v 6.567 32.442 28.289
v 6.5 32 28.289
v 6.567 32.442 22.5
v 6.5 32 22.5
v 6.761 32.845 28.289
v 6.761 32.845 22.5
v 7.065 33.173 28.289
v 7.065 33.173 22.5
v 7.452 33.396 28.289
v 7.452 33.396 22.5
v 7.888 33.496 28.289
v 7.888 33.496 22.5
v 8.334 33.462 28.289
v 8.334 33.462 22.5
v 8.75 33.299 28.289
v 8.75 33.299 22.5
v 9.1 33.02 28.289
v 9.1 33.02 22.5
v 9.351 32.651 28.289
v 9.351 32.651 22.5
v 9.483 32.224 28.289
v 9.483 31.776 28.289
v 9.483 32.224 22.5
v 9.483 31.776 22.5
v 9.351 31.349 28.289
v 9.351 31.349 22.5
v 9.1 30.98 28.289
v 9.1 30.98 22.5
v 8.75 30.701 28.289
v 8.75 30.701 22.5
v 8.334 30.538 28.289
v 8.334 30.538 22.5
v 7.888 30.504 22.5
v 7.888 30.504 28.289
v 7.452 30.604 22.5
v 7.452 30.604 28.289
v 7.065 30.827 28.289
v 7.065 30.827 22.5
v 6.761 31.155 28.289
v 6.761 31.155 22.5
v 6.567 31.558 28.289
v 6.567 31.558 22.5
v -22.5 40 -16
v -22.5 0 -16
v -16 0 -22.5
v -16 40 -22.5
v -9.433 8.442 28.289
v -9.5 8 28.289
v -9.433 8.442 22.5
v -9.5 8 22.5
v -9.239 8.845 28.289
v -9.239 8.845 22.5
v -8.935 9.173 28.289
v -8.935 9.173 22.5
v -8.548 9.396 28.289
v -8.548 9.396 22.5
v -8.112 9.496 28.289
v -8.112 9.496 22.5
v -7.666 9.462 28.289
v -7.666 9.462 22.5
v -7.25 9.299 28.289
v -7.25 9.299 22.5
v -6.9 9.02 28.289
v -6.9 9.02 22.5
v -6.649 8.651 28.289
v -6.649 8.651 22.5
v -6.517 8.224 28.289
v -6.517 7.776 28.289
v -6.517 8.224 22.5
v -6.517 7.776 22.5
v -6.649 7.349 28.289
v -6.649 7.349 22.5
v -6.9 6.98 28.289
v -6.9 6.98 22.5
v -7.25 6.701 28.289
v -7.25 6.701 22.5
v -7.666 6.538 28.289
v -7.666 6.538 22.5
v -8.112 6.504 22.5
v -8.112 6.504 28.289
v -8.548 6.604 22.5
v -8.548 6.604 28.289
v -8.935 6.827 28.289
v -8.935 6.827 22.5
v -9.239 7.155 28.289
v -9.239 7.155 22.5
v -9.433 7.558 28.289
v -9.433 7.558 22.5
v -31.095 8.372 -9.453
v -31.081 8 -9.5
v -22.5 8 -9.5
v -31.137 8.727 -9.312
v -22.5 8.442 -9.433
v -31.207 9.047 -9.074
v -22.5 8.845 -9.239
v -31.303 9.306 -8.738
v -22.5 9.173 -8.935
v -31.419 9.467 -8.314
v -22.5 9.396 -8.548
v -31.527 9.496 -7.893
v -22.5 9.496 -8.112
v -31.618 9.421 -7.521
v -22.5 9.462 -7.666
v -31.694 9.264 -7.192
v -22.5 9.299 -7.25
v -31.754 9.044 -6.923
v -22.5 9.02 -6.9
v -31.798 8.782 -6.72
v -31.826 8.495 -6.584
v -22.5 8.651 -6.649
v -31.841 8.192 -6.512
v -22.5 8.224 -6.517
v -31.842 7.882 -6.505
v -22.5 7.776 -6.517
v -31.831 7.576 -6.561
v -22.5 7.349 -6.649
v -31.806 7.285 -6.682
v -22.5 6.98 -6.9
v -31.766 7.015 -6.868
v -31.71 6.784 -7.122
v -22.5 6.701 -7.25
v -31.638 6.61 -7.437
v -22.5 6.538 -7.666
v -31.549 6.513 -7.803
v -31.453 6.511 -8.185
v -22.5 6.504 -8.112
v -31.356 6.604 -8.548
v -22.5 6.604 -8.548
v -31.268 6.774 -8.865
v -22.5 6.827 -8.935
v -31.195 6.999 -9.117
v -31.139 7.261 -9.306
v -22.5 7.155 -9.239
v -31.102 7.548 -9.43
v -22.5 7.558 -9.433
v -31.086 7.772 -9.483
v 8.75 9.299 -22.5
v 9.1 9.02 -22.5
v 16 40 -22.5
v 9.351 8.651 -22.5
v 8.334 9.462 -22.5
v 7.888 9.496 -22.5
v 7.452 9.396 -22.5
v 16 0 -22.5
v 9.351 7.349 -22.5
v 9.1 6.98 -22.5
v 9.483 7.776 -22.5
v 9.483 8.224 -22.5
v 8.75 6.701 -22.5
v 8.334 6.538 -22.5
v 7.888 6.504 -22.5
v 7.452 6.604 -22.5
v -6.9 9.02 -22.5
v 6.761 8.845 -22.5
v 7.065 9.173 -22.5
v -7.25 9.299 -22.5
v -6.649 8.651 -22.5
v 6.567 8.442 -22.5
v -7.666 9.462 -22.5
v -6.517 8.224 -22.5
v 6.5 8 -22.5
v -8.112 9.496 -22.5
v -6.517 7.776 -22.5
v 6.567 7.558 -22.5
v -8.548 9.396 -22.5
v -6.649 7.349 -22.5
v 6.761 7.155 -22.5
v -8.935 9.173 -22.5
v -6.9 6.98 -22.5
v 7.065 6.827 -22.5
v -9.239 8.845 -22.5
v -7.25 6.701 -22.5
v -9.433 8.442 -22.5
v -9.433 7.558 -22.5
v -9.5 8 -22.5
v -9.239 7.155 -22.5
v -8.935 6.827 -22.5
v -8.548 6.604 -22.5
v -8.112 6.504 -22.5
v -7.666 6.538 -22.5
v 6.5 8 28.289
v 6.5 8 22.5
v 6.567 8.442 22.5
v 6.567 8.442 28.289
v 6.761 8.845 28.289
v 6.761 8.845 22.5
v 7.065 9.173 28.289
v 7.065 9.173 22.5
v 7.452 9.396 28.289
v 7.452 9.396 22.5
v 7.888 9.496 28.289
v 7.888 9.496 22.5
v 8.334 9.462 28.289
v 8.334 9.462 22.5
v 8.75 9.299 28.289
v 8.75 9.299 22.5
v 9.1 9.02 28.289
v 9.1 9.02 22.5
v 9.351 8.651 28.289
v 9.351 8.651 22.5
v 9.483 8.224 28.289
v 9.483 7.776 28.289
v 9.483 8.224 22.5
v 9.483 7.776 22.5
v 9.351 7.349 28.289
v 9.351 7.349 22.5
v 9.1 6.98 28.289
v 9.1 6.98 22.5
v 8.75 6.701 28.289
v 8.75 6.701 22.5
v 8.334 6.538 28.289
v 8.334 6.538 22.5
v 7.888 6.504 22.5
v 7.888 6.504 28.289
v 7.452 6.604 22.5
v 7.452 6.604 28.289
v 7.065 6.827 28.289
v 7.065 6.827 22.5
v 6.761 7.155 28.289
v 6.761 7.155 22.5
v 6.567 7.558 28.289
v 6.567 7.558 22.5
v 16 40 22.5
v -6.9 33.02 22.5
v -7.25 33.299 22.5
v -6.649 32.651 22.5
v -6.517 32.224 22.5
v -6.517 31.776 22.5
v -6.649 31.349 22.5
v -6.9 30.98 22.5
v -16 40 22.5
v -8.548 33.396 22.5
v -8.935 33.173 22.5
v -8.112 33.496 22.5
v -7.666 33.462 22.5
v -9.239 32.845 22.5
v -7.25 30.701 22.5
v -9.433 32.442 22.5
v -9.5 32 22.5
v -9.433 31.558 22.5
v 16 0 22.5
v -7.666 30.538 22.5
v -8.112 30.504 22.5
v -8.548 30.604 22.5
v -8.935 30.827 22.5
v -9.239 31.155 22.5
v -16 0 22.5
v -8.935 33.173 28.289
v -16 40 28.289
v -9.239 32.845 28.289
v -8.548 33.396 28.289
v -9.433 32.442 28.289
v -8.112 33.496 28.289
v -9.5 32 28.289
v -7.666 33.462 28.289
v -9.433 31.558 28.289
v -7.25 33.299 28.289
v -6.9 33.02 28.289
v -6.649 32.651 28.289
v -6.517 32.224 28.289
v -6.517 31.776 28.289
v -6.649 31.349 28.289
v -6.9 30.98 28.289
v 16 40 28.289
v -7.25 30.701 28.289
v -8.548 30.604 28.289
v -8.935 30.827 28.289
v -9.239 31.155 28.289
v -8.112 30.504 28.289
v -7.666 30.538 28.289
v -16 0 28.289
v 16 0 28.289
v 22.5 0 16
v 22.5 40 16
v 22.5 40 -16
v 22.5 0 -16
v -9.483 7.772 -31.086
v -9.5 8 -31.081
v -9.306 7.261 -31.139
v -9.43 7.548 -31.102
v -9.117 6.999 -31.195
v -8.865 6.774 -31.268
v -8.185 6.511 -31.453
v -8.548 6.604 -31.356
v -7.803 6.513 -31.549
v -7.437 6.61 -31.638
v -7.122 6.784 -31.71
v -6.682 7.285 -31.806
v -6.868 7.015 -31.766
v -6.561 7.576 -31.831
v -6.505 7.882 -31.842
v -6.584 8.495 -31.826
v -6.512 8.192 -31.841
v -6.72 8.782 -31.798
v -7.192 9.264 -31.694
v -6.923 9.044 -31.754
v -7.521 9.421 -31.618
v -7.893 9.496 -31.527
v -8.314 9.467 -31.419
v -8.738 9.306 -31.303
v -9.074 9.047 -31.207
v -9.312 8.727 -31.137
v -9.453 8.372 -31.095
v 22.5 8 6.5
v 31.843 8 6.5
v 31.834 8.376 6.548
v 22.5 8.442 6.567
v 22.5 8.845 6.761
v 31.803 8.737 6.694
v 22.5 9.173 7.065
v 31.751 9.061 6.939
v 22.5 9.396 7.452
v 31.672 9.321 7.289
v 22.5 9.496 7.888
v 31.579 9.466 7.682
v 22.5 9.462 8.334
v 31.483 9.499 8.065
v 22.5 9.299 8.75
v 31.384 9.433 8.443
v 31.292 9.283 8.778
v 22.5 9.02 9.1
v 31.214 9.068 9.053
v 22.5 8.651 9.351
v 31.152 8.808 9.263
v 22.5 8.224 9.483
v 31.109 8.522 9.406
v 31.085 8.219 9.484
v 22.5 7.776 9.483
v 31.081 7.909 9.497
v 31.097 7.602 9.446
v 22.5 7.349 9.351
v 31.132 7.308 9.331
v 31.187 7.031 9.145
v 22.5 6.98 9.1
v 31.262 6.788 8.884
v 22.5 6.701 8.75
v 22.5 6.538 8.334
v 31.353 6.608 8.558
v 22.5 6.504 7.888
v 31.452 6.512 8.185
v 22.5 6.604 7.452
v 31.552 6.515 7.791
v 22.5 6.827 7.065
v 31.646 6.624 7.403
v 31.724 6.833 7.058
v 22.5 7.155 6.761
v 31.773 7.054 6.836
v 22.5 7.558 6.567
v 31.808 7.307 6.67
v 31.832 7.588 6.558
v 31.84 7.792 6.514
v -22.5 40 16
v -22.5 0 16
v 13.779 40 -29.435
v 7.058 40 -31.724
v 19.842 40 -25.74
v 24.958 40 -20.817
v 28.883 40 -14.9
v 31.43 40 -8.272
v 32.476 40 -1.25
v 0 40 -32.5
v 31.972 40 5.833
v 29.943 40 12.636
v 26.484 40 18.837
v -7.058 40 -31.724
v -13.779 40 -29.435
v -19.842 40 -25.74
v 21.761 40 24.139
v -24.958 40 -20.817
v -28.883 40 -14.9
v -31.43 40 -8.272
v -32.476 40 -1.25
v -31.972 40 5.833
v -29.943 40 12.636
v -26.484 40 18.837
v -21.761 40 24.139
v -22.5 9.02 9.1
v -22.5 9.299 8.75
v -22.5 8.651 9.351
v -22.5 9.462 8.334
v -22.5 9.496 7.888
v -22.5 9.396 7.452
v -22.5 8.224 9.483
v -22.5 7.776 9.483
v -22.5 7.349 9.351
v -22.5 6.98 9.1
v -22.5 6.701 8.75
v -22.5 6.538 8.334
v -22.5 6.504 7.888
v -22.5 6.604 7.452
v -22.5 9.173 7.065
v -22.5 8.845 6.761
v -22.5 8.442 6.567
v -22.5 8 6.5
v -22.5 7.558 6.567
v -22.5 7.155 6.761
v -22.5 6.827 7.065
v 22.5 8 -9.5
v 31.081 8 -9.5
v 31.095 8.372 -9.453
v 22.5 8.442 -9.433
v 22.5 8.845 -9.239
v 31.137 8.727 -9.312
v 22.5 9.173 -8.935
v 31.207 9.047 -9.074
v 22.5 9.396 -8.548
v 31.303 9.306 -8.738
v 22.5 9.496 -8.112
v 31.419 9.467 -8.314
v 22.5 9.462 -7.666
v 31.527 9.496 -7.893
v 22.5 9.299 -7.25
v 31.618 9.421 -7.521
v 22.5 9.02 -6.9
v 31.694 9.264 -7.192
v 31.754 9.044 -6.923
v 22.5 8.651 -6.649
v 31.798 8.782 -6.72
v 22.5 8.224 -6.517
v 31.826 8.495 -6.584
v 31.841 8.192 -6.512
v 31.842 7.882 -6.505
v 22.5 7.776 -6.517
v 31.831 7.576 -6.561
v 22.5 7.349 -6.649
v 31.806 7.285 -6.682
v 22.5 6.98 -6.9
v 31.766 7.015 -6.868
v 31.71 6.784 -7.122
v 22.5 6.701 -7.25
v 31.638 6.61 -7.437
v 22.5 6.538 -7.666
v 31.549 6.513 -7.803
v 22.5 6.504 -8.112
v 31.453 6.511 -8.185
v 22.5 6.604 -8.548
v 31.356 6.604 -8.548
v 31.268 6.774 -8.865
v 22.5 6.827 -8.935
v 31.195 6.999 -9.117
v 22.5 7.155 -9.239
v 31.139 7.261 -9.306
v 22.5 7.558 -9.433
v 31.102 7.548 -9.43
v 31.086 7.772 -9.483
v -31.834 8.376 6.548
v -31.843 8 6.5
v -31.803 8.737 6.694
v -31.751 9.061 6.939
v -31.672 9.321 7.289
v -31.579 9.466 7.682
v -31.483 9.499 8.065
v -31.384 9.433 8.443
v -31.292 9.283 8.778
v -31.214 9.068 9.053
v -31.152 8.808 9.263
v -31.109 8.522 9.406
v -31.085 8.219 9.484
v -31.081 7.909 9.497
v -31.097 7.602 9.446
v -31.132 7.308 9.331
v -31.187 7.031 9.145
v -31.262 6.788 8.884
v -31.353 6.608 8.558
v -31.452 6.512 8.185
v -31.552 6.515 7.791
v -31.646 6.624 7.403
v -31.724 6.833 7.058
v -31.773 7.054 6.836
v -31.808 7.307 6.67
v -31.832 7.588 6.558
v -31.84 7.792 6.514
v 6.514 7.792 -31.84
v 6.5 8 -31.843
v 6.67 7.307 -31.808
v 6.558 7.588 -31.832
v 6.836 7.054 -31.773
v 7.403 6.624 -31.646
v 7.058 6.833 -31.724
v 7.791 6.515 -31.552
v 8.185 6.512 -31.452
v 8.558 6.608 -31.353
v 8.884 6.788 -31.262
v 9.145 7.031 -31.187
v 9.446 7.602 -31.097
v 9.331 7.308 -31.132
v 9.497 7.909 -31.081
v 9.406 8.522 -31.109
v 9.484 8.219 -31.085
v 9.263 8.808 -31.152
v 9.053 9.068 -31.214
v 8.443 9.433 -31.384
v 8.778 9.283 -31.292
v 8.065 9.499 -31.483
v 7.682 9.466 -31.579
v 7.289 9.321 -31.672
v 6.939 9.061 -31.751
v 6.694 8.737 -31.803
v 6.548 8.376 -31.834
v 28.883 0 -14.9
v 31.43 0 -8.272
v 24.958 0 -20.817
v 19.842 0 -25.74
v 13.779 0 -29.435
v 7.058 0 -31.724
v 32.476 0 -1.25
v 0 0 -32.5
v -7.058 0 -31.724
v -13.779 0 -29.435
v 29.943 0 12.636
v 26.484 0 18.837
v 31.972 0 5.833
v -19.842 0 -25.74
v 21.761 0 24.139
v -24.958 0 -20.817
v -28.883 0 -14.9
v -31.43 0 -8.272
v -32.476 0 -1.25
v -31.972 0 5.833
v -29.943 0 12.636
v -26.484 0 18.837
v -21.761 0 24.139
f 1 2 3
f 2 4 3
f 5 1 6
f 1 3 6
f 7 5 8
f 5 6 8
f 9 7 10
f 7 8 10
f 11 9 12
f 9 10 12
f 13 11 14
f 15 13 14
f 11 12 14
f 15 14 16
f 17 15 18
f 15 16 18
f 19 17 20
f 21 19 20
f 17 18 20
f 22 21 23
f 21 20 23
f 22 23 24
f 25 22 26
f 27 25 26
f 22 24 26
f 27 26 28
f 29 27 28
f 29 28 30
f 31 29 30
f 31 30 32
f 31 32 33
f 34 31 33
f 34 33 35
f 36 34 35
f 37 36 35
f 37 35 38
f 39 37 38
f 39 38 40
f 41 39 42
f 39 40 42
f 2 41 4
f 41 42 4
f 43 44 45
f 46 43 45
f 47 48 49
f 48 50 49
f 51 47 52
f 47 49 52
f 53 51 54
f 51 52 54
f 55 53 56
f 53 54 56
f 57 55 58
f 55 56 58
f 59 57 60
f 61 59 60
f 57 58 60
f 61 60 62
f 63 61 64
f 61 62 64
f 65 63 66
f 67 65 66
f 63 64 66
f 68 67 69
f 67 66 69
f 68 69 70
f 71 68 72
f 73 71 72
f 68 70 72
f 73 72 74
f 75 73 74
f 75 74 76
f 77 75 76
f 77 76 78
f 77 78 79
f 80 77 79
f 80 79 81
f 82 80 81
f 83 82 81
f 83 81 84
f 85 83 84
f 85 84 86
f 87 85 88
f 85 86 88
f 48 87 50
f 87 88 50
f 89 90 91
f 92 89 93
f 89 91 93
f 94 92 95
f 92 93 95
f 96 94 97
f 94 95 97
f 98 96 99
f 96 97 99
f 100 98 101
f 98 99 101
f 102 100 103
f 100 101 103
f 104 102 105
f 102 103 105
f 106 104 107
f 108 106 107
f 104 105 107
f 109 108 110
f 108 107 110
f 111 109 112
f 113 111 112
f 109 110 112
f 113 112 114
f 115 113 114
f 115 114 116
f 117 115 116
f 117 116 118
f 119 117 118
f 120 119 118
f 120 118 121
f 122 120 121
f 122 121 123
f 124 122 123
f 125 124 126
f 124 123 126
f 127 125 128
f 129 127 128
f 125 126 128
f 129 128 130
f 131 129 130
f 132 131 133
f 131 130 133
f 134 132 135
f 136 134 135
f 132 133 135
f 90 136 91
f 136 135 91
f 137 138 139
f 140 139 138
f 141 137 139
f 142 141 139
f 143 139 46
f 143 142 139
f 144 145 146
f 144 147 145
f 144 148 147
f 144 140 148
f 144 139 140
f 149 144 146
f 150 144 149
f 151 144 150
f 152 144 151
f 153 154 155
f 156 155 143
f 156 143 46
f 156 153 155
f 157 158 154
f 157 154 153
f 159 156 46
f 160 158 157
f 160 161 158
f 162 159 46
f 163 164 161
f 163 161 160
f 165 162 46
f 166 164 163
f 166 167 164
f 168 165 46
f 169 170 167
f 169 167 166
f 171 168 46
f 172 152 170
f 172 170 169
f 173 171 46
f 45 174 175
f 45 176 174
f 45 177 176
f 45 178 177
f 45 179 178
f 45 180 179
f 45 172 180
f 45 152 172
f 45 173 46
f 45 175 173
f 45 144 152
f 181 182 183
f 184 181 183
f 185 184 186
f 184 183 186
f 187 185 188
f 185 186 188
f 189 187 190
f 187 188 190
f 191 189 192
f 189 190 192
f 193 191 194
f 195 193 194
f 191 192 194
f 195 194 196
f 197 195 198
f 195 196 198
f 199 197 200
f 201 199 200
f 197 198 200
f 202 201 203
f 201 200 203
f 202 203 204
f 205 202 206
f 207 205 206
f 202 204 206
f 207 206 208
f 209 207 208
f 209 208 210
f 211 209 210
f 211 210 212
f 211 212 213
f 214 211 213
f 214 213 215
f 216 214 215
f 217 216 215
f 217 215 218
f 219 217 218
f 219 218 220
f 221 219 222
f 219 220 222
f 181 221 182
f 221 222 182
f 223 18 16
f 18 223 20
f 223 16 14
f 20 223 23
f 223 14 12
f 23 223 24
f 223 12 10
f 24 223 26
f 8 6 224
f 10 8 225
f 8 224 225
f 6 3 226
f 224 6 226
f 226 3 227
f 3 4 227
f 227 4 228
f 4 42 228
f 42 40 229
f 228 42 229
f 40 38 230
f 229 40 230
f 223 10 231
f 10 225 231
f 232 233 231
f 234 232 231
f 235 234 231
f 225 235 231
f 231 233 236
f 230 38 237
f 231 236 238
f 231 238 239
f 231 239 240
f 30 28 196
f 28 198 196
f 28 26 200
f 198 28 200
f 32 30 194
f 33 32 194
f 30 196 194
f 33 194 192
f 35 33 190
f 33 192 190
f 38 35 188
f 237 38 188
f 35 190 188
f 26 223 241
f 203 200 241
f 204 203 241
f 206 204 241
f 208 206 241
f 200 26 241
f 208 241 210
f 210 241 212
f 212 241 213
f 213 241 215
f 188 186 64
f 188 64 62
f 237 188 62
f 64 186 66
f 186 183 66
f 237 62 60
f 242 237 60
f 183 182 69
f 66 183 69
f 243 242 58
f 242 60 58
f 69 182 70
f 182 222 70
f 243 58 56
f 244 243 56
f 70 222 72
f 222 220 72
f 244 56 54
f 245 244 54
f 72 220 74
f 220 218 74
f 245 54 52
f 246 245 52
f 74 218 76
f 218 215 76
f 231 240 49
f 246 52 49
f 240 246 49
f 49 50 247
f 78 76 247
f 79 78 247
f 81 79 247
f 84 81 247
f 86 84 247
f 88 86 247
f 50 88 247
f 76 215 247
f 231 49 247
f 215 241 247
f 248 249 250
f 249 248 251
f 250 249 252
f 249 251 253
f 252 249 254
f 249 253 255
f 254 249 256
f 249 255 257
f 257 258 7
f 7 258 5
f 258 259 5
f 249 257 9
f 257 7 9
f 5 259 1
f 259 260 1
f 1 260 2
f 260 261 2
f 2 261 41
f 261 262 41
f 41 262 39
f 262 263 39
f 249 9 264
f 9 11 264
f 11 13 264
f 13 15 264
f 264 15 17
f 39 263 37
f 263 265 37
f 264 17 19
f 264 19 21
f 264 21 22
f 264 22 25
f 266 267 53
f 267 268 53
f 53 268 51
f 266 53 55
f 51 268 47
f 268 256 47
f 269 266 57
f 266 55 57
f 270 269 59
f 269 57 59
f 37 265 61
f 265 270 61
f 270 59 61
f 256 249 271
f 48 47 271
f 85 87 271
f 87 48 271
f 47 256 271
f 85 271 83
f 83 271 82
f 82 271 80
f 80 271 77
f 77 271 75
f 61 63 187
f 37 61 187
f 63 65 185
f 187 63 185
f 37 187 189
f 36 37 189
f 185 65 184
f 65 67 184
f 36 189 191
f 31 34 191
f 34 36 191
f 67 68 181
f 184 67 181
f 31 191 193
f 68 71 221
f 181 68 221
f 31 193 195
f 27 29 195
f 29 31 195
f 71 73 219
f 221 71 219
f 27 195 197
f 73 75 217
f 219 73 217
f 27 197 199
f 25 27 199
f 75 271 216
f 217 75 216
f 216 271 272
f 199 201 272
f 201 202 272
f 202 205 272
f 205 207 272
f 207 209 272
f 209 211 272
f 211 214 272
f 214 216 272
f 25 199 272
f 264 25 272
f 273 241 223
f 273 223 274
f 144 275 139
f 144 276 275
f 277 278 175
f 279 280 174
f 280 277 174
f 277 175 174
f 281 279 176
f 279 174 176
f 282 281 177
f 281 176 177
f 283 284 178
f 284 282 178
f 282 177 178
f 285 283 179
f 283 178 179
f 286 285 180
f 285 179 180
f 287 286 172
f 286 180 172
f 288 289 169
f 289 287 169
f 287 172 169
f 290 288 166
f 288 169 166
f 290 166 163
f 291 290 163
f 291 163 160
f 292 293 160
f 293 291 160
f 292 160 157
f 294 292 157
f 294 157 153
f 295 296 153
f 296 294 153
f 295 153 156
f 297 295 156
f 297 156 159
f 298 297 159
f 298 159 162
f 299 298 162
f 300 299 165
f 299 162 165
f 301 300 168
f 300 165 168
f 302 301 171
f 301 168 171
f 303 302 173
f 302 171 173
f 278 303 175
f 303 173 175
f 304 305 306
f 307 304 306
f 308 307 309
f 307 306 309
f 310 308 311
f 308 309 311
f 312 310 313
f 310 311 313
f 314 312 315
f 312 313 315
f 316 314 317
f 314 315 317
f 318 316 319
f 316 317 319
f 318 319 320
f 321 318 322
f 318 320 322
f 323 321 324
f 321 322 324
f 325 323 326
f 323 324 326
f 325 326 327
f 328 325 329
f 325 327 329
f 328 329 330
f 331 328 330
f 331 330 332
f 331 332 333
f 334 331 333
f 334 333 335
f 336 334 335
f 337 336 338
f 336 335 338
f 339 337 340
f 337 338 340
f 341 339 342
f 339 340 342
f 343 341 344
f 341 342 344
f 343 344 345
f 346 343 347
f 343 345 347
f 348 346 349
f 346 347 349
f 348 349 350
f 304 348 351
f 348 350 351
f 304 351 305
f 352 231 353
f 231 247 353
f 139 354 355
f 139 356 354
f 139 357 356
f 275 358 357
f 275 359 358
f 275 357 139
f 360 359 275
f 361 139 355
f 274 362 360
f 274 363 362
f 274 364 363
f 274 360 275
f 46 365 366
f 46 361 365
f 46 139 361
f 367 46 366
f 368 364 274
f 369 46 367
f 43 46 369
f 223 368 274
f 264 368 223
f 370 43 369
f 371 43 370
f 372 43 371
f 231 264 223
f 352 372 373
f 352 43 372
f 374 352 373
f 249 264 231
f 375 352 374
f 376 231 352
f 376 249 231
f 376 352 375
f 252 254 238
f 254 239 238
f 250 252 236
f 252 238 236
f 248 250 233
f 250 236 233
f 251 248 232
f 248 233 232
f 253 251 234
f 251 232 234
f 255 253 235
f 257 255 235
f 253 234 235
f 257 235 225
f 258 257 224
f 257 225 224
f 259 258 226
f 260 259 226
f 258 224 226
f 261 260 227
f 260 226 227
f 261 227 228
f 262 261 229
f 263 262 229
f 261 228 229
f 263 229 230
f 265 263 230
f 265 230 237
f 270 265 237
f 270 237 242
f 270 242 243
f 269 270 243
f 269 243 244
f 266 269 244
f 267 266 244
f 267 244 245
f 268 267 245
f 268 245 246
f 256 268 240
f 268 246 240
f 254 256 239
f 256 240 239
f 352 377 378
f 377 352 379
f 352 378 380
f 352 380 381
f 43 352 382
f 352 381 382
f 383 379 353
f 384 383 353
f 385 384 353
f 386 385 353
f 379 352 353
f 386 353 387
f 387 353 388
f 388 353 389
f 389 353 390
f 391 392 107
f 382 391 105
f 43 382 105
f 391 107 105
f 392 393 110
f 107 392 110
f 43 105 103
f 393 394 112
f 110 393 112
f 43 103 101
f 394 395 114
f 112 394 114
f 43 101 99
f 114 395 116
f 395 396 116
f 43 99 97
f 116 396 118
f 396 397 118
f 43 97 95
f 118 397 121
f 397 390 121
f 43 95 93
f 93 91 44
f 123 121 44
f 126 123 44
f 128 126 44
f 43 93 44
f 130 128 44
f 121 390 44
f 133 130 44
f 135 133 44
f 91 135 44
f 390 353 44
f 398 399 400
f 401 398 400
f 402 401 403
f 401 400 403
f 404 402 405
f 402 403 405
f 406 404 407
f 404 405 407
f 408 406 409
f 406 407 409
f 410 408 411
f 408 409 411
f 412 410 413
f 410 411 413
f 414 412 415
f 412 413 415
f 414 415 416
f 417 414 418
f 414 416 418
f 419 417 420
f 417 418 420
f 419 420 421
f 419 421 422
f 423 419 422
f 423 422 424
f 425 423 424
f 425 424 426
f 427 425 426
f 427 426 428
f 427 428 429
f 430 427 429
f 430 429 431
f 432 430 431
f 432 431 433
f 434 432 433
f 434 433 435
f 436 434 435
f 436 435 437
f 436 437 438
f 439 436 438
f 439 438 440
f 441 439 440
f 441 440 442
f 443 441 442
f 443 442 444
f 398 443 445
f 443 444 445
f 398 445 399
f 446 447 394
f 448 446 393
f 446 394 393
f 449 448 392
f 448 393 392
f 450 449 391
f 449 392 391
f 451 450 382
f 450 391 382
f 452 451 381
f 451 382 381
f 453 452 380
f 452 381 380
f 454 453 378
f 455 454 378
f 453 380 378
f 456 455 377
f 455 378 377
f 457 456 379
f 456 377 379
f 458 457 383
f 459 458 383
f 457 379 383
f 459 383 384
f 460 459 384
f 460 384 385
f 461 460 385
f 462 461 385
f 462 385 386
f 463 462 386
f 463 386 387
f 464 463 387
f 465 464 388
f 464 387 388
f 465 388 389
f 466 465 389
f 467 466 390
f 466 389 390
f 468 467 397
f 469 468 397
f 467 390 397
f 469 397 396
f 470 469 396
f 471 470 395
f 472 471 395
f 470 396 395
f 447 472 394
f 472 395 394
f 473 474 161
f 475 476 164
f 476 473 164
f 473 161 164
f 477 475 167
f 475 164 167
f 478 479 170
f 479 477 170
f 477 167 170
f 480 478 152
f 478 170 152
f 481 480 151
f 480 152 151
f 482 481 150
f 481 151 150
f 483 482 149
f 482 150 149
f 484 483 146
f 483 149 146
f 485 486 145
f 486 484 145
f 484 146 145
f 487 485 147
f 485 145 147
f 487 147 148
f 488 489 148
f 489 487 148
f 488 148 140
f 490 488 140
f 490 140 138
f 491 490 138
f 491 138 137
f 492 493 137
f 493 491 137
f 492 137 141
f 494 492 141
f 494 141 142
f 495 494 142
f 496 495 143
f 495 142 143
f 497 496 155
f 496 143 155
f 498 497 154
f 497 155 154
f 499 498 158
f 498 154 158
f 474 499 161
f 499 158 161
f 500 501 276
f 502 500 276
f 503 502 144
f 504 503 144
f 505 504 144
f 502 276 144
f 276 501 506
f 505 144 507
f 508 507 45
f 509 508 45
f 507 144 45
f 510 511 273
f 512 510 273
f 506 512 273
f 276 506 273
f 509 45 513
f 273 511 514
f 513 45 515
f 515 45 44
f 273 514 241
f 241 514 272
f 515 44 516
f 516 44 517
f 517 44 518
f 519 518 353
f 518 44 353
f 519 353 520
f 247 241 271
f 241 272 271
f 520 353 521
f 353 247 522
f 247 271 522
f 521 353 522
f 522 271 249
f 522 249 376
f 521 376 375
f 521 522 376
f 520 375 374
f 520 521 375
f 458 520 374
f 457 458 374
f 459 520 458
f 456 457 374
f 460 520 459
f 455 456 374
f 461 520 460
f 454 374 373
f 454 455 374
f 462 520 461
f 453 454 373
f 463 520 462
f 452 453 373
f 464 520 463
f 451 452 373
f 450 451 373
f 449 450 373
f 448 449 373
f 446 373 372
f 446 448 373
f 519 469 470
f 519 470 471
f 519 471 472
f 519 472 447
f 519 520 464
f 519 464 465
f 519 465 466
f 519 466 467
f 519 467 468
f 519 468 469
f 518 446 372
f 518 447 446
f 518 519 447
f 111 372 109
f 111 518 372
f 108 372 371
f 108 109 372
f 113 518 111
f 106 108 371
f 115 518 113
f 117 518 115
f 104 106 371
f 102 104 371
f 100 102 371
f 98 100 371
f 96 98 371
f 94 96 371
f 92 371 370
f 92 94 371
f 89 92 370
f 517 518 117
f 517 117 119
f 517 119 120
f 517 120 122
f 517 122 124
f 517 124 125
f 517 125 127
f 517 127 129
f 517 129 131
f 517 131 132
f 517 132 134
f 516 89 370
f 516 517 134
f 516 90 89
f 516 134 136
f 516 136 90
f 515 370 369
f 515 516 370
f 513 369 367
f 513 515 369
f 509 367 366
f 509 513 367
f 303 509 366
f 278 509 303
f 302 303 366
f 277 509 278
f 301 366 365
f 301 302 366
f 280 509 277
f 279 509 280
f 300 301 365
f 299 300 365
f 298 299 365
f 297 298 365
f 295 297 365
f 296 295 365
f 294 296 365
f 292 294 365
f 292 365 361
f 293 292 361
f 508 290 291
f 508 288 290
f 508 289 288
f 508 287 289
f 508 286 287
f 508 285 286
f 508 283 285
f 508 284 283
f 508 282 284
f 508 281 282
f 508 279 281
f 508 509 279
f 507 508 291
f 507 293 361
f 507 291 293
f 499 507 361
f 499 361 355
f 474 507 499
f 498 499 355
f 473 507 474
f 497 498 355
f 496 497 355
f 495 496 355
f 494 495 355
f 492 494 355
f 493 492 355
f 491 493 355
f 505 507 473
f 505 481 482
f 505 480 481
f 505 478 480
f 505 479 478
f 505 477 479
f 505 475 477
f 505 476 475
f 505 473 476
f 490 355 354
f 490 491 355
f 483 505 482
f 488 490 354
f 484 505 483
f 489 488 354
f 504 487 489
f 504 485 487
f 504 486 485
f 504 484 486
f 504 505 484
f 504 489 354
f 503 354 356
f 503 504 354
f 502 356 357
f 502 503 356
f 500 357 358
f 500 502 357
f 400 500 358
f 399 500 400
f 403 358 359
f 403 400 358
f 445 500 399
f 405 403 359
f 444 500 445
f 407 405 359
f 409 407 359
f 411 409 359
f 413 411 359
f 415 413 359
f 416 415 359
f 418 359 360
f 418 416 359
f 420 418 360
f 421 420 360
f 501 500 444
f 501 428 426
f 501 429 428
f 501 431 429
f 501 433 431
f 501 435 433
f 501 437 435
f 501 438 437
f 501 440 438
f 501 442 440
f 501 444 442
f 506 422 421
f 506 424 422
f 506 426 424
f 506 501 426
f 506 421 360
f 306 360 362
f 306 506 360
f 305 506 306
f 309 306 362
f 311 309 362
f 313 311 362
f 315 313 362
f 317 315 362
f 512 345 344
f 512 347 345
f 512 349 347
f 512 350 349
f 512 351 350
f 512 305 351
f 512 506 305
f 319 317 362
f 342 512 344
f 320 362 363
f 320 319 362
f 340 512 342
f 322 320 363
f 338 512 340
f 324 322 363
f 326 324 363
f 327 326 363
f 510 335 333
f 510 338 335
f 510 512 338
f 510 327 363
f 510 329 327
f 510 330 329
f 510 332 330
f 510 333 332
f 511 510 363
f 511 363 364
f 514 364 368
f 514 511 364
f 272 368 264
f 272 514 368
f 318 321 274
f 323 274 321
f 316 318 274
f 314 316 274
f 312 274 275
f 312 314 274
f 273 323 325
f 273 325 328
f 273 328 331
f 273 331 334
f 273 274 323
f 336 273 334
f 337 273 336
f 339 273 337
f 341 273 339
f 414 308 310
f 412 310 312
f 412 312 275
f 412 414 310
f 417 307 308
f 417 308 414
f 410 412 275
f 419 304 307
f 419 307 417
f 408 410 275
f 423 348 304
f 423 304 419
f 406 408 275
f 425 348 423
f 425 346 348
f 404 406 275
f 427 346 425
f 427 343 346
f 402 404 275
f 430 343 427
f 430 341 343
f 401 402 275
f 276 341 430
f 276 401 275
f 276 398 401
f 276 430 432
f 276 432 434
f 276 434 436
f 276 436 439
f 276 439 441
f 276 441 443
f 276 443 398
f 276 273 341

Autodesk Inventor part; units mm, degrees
ref_plane "YZ Plane" through (0, 0, 0) normal (1, 0, 0) x (0, 1, 0)
ref_plane "XZ Plane" through (0, 0, 0) normal (0, 1, 0) x (-1, 0, 0)
ref_plane "XY Plane" through (0, 0, 0) normal (0, 0, 1) x (1, 0, 0)
sketch "Boceto1" plane through (0, 0, 0) normal (0, 1, 0) x (-1, 0, 0)
  circle A0 centre (0, 0) radius 32.5
  line L0 (0, -22.5) -> (16, -22.5)
  line L1 (0, -22.5) -> (-16, -22.5)
  line L2 (-22.5, 0) -> (-22.5, -16)
  line L3 (-22.5, 0) -> (-22.5, 16)
  line L4 (0, 22.5) -> (16, 22.5)
  line L5 (0, 22.5) -> (-16, 22.5)
  line L6 (-16, 22.5) -> (-22.5, 16)
  line L7 (-22.5, -16) -> (-16, -22.5)
  line L8 (22.5, 0) -> (22.5, 16)
  line L9 (22.5, 0) -> (22.5, -16)
  line L10 (22.5, -16) -> (16, -22.5)
  line L11 (16, 22.5) -> (22.5, 16)
extrude "Extrusión1" add sketch "Boceto1" along normal blind 40
sketch "Boceto14" plane through (0, 0, 0) normal (0, -1, 0) x (1, 0, 0)
  line L0 (-16, 28.2887) -> (16, 28.2887)
  arc A0 (16, 28.2887) -> (-16, 28.2887) centre (0, 0) ccw
  point P0 (16, 22.5)
  point P1 (-16, 22.5)
extrude "Extrusión10" cut sketch "Boceto14" against normal blind 40
sketch "Boceto15" plane through (-22.5, 0, 16) normal (1, 0, 0) x (0, 0, -1)
  circle A0 centre (8, 8) radius 1.5
  circle A1 centre (24, 8) radius 1.5
  point P0 (16, 0)
  point P1 (0, 0)
  dimension "d80" = 3
  dimension "d81" = 3
extrude "Extrusión11" cut sketch "Boceto15" against normal mid plane 200
sketch "Boceto16" plane through (16, 0, 22.5) normal (0, 0, -1) x (-1, 0, 0)
  line L0 (-6.5, 0) -> (0, 0) projected
  circle A0 centre (8, 8) radius 1.5
  circle A1 centre (24, 8) radius 1.5
  point P0 (16, 0)
  dimension "d88" = 3
  dimension "d89" = 3
extrude "Extrusión12" cut sketch "Boceto16" along normal mid plane 200
sketch "Boceto17" plane through (16, 0, 22.5) normal (0, 0, -1) x (-1, 0, 0)
  circle A0 centre (8, 32) radius 1.5
  circle A1 centre (24, 32) radius 1.5
  point P0 (16, 0)
  point P1 (0, 40)
  dimension "d95" = 3
  dimension "d96" = 3
extrude "Extrusión13" cut sketch "Boceto17" against normal blind 200
properties part number "brazo_articulado_2" material "Plástico ABS"
